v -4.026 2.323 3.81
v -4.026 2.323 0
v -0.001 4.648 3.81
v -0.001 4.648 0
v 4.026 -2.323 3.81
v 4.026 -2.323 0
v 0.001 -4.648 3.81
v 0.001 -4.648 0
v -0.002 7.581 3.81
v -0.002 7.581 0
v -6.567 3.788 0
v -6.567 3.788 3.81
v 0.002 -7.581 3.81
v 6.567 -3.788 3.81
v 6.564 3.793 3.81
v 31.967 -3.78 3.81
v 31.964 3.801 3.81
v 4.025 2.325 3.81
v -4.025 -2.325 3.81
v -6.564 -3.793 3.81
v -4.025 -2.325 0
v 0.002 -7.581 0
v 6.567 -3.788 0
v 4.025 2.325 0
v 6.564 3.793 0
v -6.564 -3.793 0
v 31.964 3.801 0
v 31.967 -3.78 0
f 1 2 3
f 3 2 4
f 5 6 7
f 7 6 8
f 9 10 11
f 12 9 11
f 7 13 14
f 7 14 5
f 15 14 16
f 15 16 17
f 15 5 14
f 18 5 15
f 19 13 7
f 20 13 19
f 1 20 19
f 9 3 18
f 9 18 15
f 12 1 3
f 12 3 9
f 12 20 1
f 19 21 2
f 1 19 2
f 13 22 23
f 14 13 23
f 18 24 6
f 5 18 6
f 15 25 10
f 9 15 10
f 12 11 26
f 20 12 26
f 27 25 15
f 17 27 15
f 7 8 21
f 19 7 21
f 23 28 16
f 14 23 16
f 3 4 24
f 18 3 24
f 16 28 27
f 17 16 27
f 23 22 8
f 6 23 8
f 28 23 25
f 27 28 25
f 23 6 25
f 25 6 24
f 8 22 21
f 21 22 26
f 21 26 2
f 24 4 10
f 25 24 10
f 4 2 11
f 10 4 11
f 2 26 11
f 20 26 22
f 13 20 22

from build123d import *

# Parameters (mm, degrees)
F1_DEPTH = 3.81
F2_DEPTH = 25.4


with BuildPart() as f1:
    # F0 (on Top) → F1 (new body)
    with BuildSketch(Plane.XY):
        Polygon((6.5642443103, 3.7926732977), (-0.0024292689, 7.5811389783), (-6.5666735793, 3.7884656805), (-6.5642443103, -3.7926732977), (0.0024292689, -7.5811389783), (6.5666735793, -3.7884656805), align=None)
        Polygon((-4.0262038002, 2.3228099792), (-0.00148945, 4.6481997614), (4.0247143502, 2.3253897822), (4.0262038002, -2.3228099792), (0.00148945, -4.6481997614), (-4.0247143502, -2.3253897822), align=None, mode=Mode.SUBTRACT)
    extrude(amount=F1_DEPTH)

    # F2 (add): a face of the model
    f2_faces = [f1.faces().sort_by_distance(p)[0] for p in [
        (6.5654589448, 0.0021038086, 1.905),
    ]]
    extrude(f2_faces, amount=F2_DEPTH)


solid = f1.part
